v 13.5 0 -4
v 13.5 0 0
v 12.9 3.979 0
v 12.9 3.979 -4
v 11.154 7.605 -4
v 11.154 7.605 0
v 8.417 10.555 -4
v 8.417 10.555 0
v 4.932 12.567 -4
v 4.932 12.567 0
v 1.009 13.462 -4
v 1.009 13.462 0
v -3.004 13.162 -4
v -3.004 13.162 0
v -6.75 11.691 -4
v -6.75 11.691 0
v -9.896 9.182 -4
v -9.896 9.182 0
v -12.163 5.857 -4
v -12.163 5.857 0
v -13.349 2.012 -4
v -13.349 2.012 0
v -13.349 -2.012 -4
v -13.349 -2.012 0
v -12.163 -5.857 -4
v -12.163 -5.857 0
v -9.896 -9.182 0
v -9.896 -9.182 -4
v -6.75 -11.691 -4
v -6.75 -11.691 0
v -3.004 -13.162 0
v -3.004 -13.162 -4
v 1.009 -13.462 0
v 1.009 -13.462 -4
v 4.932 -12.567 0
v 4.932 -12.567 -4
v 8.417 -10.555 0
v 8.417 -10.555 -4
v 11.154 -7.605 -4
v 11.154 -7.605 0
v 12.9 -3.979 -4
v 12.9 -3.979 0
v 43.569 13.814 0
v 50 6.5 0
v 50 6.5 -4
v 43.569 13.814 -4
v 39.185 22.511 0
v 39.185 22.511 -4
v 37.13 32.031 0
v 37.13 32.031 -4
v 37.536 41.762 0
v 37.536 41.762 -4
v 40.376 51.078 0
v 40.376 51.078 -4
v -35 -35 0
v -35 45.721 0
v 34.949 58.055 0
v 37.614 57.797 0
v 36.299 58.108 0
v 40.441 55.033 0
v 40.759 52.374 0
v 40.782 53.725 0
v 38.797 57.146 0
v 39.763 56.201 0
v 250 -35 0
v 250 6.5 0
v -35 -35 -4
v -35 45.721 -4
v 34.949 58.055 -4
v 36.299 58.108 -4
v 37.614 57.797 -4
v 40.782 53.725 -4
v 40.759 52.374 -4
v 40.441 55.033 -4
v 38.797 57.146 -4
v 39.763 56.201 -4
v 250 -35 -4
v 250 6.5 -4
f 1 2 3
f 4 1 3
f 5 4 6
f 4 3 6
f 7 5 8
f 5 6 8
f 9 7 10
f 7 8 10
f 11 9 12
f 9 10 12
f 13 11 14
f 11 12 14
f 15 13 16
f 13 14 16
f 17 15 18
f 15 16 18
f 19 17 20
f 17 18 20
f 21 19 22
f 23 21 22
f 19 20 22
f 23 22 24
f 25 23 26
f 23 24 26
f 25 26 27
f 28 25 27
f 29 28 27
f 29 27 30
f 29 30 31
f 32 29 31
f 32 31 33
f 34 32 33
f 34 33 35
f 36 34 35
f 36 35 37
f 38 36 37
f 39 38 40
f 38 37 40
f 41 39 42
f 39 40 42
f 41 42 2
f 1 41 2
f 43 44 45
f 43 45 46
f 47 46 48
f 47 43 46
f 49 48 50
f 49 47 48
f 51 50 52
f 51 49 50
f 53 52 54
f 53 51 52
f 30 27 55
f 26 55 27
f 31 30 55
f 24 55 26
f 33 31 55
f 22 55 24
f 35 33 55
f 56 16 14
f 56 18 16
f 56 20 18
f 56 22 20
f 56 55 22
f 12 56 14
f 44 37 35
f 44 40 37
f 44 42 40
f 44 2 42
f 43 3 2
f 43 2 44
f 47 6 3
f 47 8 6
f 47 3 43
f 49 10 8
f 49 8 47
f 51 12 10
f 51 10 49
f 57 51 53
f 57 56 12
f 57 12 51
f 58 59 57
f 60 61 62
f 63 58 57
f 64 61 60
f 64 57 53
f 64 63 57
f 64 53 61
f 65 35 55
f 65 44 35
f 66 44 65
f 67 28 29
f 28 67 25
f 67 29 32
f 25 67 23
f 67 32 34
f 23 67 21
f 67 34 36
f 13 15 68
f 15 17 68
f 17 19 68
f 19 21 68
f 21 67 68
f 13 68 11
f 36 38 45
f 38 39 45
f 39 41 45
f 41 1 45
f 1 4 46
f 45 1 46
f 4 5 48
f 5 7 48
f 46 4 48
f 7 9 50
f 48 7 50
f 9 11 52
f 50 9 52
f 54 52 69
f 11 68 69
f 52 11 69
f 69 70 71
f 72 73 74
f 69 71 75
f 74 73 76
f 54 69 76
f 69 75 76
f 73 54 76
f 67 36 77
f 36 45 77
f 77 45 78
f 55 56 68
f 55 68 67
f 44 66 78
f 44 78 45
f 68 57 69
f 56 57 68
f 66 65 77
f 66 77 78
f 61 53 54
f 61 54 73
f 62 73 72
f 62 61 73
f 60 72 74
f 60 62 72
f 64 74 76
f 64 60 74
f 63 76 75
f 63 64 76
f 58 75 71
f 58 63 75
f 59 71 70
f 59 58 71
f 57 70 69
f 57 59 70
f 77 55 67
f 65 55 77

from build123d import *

# Parameters (mm, degrees)
SKETCH_1_R             = 13.5
SM_BASE_FLANGE_1_DEPTH = 4


# Sheet-metal steps are written as plain solids
with BuildPart() as part:
    # Sketch 1 → Базовая кромка1 (new body)
    with BuildSketch(Plane.XY):
        with BuildLine():
            Line((0, -35), (250, -35))
            Line((250, -35), (250, 6.5))
            Line((250, 6.5), (50, 6.5))
            ThreePointArc((50, 6.5), (37.854703837, 27.206009472), (40.376084675, 51.078371856))
            ThreePointArc((40.376084675, 51.078371856), (39.763461316, 56.201257152), (34.948705483, 58.055276407))
            Line((34.948705483, 58.055276407), (-35, 45.721432364))
            Line((-35, 45.721432364), (-35, -35))
            Line((-35, -35), (0, -35))
        make_face()
        Circle(SKETCH_1_R, mode=Mode.SUBTRACT)
    extrude(amount=-SM_BASE_FLANGE_1_DEPTH)


solid = part.part
